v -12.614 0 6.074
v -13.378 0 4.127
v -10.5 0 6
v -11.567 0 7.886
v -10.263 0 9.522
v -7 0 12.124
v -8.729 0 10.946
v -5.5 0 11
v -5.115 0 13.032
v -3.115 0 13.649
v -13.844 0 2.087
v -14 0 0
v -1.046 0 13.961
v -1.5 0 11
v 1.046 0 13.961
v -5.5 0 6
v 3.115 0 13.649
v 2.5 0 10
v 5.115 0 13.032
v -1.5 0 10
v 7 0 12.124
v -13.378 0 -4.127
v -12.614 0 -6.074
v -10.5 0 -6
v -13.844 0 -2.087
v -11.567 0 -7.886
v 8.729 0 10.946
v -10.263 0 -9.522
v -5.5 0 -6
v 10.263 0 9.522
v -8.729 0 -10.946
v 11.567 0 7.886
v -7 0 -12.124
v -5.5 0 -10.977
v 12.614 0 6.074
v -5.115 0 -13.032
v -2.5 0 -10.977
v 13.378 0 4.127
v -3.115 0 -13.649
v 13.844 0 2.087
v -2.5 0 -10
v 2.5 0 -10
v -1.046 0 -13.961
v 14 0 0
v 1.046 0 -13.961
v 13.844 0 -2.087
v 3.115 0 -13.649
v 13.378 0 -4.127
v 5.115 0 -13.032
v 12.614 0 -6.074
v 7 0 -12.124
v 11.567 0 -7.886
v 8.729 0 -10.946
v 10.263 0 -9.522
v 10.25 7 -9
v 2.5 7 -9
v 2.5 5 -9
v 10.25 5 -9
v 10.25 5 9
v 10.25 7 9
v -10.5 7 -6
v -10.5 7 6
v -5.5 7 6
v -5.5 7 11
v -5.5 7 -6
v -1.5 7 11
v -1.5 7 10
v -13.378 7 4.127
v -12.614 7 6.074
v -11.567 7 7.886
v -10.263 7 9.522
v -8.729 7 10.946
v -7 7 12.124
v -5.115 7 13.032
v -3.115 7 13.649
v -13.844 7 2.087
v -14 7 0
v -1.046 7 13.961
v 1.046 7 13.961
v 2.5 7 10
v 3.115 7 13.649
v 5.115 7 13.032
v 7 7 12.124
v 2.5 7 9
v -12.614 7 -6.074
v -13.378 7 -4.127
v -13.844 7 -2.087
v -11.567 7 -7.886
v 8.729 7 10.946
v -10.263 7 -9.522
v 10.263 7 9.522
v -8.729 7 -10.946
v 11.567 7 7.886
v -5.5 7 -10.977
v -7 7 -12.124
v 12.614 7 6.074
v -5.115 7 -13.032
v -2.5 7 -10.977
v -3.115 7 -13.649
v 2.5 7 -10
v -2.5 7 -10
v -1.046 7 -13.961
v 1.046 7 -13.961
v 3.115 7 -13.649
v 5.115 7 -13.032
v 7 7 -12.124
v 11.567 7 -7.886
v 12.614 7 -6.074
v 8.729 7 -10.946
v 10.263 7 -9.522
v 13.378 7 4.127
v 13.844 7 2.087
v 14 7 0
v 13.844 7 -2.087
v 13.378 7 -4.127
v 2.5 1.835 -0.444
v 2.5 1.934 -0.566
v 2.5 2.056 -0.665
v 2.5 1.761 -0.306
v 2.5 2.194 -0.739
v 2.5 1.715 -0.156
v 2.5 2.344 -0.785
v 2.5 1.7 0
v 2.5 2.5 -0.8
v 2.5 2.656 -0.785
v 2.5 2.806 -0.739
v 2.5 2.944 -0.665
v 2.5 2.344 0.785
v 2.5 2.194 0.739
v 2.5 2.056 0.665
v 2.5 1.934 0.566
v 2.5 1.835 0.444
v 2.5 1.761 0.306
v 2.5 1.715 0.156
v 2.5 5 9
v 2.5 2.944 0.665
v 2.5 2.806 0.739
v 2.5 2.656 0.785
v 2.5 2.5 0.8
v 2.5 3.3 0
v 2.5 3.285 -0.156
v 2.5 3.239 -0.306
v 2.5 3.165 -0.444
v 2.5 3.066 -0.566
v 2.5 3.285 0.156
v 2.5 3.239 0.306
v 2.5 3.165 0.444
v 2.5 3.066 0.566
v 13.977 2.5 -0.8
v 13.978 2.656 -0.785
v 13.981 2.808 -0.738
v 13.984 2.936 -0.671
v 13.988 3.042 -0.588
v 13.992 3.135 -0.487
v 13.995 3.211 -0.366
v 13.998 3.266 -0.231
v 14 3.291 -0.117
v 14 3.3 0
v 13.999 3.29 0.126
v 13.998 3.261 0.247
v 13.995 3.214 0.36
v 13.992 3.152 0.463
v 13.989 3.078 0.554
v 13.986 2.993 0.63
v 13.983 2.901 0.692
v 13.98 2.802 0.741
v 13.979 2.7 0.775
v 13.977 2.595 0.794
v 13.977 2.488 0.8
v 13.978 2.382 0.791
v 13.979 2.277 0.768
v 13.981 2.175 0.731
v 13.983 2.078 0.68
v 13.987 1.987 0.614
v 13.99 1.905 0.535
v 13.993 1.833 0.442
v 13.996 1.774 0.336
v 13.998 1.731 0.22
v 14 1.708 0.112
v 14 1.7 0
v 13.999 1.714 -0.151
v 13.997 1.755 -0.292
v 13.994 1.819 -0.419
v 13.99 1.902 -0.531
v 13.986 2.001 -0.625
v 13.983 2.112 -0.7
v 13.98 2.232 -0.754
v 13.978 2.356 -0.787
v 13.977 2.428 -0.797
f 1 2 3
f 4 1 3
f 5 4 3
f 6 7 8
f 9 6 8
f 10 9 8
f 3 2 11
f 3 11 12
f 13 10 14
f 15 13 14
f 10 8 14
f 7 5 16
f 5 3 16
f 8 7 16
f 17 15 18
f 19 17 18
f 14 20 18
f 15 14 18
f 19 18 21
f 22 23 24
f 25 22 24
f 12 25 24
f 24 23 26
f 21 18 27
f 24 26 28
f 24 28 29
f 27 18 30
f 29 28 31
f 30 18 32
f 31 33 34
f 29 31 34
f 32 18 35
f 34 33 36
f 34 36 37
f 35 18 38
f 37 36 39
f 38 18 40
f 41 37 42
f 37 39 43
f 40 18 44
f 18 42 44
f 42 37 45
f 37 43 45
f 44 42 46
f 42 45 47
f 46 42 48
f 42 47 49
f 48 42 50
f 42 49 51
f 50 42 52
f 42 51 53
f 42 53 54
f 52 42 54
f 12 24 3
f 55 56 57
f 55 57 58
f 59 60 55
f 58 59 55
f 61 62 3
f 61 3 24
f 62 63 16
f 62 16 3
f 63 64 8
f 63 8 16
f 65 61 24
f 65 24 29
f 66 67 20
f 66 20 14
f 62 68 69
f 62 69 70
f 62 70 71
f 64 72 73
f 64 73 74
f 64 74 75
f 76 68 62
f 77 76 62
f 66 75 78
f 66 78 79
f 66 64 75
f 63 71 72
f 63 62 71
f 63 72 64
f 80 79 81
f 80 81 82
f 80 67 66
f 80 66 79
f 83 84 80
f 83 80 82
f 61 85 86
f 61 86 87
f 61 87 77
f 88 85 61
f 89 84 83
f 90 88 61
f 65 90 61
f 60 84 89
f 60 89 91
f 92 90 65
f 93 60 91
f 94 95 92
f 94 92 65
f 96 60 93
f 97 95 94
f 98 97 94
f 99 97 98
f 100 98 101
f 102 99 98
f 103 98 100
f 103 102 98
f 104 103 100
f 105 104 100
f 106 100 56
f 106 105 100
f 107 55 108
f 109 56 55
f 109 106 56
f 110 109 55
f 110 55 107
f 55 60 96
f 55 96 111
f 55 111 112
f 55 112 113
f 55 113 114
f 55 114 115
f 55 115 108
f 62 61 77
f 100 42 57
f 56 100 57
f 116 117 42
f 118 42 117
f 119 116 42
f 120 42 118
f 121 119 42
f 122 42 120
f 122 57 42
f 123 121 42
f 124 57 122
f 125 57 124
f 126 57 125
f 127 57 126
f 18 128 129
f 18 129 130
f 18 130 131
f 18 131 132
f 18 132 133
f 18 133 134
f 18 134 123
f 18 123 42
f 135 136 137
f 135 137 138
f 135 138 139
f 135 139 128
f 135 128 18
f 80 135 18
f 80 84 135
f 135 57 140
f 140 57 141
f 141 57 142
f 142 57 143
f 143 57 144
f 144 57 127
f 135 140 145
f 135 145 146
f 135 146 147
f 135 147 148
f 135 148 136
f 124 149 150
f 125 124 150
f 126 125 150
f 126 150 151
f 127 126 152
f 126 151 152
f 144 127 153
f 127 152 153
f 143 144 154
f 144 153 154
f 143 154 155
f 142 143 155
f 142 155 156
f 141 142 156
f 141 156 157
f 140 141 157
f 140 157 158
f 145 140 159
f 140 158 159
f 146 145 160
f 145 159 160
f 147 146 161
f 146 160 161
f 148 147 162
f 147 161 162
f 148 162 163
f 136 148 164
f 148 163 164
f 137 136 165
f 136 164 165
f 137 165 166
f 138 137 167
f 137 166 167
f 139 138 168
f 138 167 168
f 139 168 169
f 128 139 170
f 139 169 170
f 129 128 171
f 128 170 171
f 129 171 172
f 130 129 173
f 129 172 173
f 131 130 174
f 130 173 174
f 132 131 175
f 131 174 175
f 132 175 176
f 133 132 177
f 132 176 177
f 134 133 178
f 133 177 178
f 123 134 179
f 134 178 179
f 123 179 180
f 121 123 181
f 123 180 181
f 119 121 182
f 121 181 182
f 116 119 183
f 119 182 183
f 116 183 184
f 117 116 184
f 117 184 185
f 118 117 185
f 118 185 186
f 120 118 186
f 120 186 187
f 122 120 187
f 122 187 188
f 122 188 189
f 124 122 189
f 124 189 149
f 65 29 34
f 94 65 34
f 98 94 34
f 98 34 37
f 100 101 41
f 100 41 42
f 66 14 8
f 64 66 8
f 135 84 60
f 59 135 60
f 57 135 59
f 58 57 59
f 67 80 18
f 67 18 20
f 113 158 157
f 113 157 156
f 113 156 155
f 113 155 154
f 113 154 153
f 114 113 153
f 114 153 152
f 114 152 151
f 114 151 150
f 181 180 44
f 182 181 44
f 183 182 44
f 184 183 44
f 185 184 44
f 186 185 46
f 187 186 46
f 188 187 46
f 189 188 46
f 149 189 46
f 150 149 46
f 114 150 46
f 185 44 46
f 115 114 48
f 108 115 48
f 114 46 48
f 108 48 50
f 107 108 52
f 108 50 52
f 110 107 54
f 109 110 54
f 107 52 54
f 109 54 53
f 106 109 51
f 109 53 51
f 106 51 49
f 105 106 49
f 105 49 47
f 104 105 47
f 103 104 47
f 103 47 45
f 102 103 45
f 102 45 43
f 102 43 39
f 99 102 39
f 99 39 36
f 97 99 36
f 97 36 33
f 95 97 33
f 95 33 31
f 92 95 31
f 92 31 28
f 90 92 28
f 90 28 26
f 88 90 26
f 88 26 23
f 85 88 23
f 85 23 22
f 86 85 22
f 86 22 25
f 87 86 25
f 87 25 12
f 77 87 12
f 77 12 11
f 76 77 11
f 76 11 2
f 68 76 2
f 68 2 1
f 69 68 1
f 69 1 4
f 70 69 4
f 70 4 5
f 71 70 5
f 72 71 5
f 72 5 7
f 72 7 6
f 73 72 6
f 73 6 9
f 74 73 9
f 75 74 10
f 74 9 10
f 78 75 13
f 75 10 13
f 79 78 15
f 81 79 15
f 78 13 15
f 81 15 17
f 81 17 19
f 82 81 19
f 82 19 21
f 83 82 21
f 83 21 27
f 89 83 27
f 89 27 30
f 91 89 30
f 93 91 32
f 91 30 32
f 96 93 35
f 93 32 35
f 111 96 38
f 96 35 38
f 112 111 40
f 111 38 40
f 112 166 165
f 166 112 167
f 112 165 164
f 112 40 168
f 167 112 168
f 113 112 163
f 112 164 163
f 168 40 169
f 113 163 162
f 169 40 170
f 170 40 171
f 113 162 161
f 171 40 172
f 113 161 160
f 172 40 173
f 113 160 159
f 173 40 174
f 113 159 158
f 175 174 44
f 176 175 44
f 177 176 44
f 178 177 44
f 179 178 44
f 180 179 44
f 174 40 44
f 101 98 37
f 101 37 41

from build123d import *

# Parameters (mm, degrees)
SKETCH_3_R          = 14
EXTRUDE_2_DEPTH     = 7
CUT_EXTRUDE_1_DEPTH = 8
SKETCH_10_W         = 12
SKETCH_10_H         = 18
CUT_EXTRUDE_2_DEPTH = 2
SKETCH_12_R         = 0.8
CUT_EXTRUDE_3_DEPTH = 11.5


with BuildPart() as part:
    # Эскиз3 → Бобышка-Вытянуть2 (new body)
    with BuildSketch(Plane(origin=(0, 0, 0), x_dir=(1, 0, 0), z_dir=(0, 1, 0))):
        Circle(SKETCH_3_R)
    extrude(amount=EXTRUDE_2_DEPTH)

    # Эскиз8 → Вырез-Вытянуть1 (cut, through all)
    with BuildSketch(Plane(origin=(0, 7, 0), x_dir=(1, 0, 0), z_dir=(0, 1, 0))):
        Polygon((-2.5, 10.977260976), (-2.5, 10), (2.5, 10), (2.5, -10), (-1.5, -10), (-1.5, -11), (-5.5, -11), (-5.5, -6), (-10.5, -6), (-10.5, 6), (-5.5, 6), (-5.5, 10.977260976), align=None)
    extrude(amount=-CUT_EXTRUDE_1_DEPTH, mode=Mode.SUBTRACT)

    # Эскиз10 → Вырез-Вытянуть2 (cut)
    with BuildSketch(Plane(origin=(0, 7, 0), x_dir=(1, 0, 0), z_dir=(0, 1, 0))):
        with Locations((4.25, 0)):
            Rectangle(SKETCH_10_W, SKETCH_10_H)
    extrude(amount=-CUT_EXTRUDE_2_DEPTH, mode=Mode.SUBTRACT)

    # Эскиз12 → Вырез-Вытянуть3 (cut)
    with BuildSketch(Plane(origin=(14, 0, 0), x_dir=(0, 0, -1), z_dir=(1, 0, 0))):
        with Locations((0, 2.5)):
            Circle(SKETCH_12_R)
    extrude(amount=-CUT_EXTRUDE_3_DEPTH, mode=Mode.SUBTRACT)


solid = part.part
